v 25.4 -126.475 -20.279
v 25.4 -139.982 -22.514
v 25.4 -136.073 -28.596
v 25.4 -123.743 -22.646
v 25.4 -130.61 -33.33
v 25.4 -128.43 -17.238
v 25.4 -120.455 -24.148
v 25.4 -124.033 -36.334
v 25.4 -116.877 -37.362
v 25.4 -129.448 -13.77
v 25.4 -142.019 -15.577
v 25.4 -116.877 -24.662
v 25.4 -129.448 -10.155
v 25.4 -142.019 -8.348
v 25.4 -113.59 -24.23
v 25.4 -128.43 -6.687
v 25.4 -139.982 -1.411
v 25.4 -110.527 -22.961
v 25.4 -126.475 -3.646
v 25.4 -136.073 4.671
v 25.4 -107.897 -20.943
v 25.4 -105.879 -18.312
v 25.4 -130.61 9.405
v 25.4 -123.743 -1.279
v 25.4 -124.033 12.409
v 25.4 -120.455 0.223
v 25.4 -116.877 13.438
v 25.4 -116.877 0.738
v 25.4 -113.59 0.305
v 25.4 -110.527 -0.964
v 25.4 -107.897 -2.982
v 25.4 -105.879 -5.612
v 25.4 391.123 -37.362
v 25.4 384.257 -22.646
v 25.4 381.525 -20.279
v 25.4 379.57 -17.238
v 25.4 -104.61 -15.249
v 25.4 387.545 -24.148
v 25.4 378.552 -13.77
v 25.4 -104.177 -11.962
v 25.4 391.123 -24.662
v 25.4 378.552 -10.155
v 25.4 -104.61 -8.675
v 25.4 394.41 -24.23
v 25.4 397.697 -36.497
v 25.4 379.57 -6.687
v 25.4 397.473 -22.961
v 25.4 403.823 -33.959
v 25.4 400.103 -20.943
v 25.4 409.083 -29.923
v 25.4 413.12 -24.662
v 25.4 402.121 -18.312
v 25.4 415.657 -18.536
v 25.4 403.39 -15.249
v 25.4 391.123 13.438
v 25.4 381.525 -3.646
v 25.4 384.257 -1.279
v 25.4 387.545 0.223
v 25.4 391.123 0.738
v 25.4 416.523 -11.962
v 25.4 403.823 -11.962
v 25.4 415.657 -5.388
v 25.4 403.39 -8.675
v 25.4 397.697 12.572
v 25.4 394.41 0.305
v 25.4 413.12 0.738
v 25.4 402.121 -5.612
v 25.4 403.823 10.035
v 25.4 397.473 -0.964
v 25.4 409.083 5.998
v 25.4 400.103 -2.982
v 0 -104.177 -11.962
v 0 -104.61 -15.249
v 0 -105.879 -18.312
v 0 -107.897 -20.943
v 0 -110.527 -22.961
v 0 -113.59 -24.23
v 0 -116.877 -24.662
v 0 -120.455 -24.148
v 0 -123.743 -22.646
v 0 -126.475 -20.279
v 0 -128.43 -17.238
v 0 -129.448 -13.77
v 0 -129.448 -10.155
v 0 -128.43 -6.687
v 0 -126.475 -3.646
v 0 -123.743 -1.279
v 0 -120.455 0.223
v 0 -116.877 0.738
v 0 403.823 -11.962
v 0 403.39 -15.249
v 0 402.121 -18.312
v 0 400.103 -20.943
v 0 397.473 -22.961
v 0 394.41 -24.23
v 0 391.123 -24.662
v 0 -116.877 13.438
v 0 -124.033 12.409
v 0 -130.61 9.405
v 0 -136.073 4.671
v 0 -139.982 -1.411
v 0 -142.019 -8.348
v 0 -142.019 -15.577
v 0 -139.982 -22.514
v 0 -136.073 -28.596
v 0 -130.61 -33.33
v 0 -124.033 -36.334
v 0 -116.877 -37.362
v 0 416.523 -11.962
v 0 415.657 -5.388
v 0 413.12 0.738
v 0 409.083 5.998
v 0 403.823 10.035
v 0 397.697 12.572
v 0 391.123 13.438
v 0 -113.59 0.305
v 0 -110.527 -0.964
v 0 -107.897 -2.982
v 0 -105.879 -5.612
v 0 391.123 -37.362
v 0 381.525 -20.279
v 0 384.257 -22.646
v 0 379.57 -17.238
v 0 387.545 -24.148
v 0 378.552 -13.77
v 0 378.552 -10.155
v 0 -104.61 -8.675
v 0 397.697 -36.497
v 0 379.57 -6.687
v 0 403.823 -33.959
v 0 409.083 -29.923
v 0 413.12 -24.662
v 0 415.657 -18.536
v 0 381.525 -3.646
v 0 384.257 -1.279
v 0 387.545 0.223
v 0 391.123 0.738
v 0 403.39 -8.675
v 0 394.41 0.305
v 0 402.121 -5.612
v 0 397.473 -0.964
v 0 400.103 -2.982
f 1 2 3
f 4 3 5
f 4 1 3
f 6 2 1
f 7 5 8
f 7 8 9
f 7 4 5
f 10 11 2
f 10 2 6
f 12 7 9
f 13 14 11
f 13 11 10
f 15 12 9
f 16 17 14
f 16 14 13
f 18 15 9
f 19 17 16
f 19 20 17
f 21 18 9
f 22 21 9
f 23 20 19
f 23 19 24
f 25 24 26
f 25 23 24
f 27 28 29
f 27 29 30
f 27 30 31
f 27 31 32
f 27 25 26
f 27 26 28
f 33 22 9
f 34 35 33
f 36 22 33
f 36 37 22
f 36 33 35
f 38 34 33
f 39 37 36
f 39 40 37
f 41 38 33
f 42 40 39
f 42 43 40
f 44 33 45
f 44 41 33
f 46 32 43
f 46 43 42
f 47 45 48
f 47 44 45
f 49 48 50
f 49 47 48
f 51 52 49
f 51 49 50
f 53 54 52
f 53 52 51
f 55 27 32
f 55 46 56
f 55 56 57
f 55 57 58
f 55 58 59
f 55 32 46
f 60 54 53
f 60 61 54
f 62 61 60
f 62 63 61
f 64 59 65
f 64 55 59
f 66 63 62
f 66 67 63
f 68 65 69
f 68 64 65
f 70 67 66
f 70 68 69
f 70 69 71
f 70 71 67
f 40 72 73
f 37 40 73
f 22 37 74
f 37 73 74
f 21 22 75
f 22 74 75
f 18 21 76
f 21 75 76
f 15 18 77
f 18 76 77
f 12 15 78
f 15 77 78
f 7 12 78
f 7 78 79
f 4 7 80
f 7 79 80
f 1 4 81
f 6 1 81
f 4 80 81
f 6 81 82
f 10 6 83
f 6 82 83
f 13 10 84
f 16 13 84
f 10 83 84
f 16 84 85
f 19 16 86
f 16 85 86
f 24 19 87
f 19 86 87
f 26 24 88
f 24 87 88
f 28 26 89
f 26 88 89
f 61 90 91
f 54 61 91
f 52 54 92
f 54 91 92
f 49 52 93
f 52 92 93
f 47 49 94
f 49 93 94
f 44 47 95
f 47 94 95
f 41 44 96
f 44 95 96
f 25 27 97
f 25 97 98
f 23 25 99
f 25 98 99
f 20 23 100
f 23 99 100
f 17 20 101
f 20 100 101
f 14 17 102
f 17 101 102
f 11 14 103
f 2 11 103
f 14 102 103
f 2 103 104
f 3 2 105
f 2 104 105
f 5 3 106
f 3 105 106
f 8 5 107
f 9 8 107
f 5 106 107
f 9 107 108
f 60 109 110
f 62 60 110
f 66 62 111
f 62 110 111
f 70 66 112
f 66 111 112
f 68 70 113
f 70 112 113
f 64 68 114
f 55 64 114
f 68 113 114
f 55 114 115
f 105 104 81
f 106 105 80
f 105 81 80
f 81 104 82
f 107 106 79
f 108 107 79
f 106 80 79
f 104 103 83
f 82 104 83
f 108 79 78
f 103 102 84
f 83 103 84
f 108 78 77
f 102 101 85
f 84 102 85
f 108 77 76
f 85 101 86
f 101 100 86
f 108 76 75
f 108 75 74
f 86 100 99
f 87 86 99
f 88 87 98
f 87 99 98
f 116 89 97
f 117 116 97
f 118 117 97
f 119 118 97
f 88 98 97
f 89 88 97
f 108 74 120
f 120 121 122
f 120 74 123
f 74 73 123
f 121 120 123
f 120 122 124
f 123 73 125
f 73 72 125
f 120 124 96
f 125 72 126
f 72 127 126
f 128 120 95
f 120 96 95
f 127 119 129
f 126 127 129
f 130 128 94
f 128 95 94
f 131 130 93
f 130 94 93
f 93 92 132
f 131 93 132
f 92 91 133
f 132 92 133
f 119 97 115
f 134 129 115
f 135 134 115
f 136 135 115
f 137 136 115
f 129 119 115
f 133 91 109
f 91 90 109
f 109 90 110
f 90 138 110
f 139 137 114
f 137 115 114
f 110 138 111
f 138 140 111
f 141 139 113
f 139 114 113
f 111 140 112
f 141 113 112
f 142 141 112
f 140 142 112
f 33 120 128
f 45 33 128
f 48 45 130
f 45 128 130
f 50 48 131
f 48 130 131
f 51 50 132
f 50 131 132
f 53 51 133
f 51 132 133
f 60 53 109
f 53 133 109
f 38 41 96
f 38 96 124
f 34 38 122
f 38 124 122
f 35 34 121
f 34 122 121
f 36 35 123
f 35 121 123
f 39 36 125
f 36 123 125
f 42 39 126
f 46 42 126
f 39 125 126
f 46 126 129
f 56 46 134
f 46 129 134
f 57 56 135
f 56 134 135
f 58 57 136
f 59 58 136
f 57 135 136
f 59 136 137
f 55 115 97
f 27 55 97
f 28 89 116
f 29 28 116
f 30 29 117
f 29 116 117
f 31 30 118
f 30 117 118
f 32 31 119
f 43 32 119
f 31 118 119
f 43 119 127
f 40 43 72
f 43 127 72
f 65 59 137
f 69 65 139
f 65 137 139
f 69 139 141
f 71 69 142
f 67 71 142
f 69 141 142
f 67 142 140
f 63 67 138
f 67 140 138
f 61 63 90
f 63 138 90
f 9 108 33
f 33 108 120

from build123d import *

# Parameters (mm, degrees)
F1_DEPTH = 25.4


with BuildPart() as f1:
    # F0 (on Right) → F1 (new body)
    with BuildSketch(Plane.YZ):
        with BuildLine():
            ThreePointArc((-91.4772798479, -11.9624281348), (-98.9167676057, 5.9980841073), (-116.8772798479, 13.4375718652))
            Line((-116.8772798479, 13.4375718652), (-116.8772798479, 0.7375718652))
            ThreePointArc((-116.8772798479, 0.7375718652), (-107.8970237268, -2.9821720138), (-104.1772798479, -11.9624281348))
            ThreePointArc((-104.1772798479, -11.9624281348), (-107.8970237268, -20.9426842559), (-116.8772798479, -24.6624281348))
            Line((-116.8772798479, -24.6624281348), (-116.8772798479, -37.3624281348))
            ThreePointArc((-116.8772798479, -37.3624281348), (-98.9167676057, -29.922940377), (-91.4772798479, -11.9624281348))
        make_face()
        with BuildLine():
            Line((391.1227201521, 13.4375718652), (-116.8772798479, 13.4375718652))
            ThreePointArc((-116.8772798479, 13.4375718652), (-98.9167676057, 5.9980841073), (-91.4772798479, -11.9624281348))
            ThreePointArc((-91.4772798479, -11.9624281348), (-98.9167676057, -29.922940377), (-116.8772798479, -37.3624281348))
            Line((-116.8772798479, -37.3624281348), (391.1227201521, -37.3624281348))
            ThreePointArc((391.1227201521, -37.3624281348), (365.7227201521, -11.9624281348), (391.1227201521, 13.4375718652))
        make_face()
        with BuildLine():
            Line((-116.8772798479, 0.7375718652), (-116.8772798479, 13.4375718652))
            ThreePointArc((-116.8772798479, 13.4375718652), (-142.2772798479, -11.9624281348), (-116.8772798479, -37.3624281348))
            Line((-116.8772798479, -37.3624281348), (-116.8772798479, -24.6624281348))
            ThreePointArc((-116.8772798479, -24.6624281348), (-129.5772798479, -11.9624281348), (-116.8772798479, 0.7375718652))
        make_face()
        with BuildLine():
            ThreePointArc((416.5227201521, -11.9624281348), (409.0832323943, 5.9980841073), (391.1227201521, 13.4375718652))
            Line((391.1227201521, 13.4375718652), (391.1227201521, 0.7375718652))
            ThreePointArc((391.1227201521, 0.7375718652), (400.1029762732, -2.9821720138), (403.8227201521, -11.9624281348))
            ThreePointArc((403.8227201521, -11.9624281348), (400.1029762732, -20.9426842559), (391.1227201521, -24.6624281348))
            Line((391.1227201521, -24.6624281348), (391.1227201521, -37.3624281348))
            ThreePointArc((391.1227201521, -37.3624281348), (409.0832323943, -29.922940377), (416.5227201521, -11.9624281348))
        make_face()
        with BuildLine():
            Line((391.1227201521, 0.7375718652), (391.1227201521, 13.4375718652))
            ThreePointArc((391.1227201521, 13.4375718652), (365.7227201521, -11.9624281348), (391.1227201521, -37.3624281348))
            Line((391.1227201521, -37.3624281348), (391.1227201521, -24.6624281348))
            ThreePointArc((391.1227201521, -24.6624281348), (378.4227201521, -11.9624281348), (391.1227201521, 0.7375718652))
        make_face()
    extrude(amount=F1_DEPTH)


solid = f1.part
